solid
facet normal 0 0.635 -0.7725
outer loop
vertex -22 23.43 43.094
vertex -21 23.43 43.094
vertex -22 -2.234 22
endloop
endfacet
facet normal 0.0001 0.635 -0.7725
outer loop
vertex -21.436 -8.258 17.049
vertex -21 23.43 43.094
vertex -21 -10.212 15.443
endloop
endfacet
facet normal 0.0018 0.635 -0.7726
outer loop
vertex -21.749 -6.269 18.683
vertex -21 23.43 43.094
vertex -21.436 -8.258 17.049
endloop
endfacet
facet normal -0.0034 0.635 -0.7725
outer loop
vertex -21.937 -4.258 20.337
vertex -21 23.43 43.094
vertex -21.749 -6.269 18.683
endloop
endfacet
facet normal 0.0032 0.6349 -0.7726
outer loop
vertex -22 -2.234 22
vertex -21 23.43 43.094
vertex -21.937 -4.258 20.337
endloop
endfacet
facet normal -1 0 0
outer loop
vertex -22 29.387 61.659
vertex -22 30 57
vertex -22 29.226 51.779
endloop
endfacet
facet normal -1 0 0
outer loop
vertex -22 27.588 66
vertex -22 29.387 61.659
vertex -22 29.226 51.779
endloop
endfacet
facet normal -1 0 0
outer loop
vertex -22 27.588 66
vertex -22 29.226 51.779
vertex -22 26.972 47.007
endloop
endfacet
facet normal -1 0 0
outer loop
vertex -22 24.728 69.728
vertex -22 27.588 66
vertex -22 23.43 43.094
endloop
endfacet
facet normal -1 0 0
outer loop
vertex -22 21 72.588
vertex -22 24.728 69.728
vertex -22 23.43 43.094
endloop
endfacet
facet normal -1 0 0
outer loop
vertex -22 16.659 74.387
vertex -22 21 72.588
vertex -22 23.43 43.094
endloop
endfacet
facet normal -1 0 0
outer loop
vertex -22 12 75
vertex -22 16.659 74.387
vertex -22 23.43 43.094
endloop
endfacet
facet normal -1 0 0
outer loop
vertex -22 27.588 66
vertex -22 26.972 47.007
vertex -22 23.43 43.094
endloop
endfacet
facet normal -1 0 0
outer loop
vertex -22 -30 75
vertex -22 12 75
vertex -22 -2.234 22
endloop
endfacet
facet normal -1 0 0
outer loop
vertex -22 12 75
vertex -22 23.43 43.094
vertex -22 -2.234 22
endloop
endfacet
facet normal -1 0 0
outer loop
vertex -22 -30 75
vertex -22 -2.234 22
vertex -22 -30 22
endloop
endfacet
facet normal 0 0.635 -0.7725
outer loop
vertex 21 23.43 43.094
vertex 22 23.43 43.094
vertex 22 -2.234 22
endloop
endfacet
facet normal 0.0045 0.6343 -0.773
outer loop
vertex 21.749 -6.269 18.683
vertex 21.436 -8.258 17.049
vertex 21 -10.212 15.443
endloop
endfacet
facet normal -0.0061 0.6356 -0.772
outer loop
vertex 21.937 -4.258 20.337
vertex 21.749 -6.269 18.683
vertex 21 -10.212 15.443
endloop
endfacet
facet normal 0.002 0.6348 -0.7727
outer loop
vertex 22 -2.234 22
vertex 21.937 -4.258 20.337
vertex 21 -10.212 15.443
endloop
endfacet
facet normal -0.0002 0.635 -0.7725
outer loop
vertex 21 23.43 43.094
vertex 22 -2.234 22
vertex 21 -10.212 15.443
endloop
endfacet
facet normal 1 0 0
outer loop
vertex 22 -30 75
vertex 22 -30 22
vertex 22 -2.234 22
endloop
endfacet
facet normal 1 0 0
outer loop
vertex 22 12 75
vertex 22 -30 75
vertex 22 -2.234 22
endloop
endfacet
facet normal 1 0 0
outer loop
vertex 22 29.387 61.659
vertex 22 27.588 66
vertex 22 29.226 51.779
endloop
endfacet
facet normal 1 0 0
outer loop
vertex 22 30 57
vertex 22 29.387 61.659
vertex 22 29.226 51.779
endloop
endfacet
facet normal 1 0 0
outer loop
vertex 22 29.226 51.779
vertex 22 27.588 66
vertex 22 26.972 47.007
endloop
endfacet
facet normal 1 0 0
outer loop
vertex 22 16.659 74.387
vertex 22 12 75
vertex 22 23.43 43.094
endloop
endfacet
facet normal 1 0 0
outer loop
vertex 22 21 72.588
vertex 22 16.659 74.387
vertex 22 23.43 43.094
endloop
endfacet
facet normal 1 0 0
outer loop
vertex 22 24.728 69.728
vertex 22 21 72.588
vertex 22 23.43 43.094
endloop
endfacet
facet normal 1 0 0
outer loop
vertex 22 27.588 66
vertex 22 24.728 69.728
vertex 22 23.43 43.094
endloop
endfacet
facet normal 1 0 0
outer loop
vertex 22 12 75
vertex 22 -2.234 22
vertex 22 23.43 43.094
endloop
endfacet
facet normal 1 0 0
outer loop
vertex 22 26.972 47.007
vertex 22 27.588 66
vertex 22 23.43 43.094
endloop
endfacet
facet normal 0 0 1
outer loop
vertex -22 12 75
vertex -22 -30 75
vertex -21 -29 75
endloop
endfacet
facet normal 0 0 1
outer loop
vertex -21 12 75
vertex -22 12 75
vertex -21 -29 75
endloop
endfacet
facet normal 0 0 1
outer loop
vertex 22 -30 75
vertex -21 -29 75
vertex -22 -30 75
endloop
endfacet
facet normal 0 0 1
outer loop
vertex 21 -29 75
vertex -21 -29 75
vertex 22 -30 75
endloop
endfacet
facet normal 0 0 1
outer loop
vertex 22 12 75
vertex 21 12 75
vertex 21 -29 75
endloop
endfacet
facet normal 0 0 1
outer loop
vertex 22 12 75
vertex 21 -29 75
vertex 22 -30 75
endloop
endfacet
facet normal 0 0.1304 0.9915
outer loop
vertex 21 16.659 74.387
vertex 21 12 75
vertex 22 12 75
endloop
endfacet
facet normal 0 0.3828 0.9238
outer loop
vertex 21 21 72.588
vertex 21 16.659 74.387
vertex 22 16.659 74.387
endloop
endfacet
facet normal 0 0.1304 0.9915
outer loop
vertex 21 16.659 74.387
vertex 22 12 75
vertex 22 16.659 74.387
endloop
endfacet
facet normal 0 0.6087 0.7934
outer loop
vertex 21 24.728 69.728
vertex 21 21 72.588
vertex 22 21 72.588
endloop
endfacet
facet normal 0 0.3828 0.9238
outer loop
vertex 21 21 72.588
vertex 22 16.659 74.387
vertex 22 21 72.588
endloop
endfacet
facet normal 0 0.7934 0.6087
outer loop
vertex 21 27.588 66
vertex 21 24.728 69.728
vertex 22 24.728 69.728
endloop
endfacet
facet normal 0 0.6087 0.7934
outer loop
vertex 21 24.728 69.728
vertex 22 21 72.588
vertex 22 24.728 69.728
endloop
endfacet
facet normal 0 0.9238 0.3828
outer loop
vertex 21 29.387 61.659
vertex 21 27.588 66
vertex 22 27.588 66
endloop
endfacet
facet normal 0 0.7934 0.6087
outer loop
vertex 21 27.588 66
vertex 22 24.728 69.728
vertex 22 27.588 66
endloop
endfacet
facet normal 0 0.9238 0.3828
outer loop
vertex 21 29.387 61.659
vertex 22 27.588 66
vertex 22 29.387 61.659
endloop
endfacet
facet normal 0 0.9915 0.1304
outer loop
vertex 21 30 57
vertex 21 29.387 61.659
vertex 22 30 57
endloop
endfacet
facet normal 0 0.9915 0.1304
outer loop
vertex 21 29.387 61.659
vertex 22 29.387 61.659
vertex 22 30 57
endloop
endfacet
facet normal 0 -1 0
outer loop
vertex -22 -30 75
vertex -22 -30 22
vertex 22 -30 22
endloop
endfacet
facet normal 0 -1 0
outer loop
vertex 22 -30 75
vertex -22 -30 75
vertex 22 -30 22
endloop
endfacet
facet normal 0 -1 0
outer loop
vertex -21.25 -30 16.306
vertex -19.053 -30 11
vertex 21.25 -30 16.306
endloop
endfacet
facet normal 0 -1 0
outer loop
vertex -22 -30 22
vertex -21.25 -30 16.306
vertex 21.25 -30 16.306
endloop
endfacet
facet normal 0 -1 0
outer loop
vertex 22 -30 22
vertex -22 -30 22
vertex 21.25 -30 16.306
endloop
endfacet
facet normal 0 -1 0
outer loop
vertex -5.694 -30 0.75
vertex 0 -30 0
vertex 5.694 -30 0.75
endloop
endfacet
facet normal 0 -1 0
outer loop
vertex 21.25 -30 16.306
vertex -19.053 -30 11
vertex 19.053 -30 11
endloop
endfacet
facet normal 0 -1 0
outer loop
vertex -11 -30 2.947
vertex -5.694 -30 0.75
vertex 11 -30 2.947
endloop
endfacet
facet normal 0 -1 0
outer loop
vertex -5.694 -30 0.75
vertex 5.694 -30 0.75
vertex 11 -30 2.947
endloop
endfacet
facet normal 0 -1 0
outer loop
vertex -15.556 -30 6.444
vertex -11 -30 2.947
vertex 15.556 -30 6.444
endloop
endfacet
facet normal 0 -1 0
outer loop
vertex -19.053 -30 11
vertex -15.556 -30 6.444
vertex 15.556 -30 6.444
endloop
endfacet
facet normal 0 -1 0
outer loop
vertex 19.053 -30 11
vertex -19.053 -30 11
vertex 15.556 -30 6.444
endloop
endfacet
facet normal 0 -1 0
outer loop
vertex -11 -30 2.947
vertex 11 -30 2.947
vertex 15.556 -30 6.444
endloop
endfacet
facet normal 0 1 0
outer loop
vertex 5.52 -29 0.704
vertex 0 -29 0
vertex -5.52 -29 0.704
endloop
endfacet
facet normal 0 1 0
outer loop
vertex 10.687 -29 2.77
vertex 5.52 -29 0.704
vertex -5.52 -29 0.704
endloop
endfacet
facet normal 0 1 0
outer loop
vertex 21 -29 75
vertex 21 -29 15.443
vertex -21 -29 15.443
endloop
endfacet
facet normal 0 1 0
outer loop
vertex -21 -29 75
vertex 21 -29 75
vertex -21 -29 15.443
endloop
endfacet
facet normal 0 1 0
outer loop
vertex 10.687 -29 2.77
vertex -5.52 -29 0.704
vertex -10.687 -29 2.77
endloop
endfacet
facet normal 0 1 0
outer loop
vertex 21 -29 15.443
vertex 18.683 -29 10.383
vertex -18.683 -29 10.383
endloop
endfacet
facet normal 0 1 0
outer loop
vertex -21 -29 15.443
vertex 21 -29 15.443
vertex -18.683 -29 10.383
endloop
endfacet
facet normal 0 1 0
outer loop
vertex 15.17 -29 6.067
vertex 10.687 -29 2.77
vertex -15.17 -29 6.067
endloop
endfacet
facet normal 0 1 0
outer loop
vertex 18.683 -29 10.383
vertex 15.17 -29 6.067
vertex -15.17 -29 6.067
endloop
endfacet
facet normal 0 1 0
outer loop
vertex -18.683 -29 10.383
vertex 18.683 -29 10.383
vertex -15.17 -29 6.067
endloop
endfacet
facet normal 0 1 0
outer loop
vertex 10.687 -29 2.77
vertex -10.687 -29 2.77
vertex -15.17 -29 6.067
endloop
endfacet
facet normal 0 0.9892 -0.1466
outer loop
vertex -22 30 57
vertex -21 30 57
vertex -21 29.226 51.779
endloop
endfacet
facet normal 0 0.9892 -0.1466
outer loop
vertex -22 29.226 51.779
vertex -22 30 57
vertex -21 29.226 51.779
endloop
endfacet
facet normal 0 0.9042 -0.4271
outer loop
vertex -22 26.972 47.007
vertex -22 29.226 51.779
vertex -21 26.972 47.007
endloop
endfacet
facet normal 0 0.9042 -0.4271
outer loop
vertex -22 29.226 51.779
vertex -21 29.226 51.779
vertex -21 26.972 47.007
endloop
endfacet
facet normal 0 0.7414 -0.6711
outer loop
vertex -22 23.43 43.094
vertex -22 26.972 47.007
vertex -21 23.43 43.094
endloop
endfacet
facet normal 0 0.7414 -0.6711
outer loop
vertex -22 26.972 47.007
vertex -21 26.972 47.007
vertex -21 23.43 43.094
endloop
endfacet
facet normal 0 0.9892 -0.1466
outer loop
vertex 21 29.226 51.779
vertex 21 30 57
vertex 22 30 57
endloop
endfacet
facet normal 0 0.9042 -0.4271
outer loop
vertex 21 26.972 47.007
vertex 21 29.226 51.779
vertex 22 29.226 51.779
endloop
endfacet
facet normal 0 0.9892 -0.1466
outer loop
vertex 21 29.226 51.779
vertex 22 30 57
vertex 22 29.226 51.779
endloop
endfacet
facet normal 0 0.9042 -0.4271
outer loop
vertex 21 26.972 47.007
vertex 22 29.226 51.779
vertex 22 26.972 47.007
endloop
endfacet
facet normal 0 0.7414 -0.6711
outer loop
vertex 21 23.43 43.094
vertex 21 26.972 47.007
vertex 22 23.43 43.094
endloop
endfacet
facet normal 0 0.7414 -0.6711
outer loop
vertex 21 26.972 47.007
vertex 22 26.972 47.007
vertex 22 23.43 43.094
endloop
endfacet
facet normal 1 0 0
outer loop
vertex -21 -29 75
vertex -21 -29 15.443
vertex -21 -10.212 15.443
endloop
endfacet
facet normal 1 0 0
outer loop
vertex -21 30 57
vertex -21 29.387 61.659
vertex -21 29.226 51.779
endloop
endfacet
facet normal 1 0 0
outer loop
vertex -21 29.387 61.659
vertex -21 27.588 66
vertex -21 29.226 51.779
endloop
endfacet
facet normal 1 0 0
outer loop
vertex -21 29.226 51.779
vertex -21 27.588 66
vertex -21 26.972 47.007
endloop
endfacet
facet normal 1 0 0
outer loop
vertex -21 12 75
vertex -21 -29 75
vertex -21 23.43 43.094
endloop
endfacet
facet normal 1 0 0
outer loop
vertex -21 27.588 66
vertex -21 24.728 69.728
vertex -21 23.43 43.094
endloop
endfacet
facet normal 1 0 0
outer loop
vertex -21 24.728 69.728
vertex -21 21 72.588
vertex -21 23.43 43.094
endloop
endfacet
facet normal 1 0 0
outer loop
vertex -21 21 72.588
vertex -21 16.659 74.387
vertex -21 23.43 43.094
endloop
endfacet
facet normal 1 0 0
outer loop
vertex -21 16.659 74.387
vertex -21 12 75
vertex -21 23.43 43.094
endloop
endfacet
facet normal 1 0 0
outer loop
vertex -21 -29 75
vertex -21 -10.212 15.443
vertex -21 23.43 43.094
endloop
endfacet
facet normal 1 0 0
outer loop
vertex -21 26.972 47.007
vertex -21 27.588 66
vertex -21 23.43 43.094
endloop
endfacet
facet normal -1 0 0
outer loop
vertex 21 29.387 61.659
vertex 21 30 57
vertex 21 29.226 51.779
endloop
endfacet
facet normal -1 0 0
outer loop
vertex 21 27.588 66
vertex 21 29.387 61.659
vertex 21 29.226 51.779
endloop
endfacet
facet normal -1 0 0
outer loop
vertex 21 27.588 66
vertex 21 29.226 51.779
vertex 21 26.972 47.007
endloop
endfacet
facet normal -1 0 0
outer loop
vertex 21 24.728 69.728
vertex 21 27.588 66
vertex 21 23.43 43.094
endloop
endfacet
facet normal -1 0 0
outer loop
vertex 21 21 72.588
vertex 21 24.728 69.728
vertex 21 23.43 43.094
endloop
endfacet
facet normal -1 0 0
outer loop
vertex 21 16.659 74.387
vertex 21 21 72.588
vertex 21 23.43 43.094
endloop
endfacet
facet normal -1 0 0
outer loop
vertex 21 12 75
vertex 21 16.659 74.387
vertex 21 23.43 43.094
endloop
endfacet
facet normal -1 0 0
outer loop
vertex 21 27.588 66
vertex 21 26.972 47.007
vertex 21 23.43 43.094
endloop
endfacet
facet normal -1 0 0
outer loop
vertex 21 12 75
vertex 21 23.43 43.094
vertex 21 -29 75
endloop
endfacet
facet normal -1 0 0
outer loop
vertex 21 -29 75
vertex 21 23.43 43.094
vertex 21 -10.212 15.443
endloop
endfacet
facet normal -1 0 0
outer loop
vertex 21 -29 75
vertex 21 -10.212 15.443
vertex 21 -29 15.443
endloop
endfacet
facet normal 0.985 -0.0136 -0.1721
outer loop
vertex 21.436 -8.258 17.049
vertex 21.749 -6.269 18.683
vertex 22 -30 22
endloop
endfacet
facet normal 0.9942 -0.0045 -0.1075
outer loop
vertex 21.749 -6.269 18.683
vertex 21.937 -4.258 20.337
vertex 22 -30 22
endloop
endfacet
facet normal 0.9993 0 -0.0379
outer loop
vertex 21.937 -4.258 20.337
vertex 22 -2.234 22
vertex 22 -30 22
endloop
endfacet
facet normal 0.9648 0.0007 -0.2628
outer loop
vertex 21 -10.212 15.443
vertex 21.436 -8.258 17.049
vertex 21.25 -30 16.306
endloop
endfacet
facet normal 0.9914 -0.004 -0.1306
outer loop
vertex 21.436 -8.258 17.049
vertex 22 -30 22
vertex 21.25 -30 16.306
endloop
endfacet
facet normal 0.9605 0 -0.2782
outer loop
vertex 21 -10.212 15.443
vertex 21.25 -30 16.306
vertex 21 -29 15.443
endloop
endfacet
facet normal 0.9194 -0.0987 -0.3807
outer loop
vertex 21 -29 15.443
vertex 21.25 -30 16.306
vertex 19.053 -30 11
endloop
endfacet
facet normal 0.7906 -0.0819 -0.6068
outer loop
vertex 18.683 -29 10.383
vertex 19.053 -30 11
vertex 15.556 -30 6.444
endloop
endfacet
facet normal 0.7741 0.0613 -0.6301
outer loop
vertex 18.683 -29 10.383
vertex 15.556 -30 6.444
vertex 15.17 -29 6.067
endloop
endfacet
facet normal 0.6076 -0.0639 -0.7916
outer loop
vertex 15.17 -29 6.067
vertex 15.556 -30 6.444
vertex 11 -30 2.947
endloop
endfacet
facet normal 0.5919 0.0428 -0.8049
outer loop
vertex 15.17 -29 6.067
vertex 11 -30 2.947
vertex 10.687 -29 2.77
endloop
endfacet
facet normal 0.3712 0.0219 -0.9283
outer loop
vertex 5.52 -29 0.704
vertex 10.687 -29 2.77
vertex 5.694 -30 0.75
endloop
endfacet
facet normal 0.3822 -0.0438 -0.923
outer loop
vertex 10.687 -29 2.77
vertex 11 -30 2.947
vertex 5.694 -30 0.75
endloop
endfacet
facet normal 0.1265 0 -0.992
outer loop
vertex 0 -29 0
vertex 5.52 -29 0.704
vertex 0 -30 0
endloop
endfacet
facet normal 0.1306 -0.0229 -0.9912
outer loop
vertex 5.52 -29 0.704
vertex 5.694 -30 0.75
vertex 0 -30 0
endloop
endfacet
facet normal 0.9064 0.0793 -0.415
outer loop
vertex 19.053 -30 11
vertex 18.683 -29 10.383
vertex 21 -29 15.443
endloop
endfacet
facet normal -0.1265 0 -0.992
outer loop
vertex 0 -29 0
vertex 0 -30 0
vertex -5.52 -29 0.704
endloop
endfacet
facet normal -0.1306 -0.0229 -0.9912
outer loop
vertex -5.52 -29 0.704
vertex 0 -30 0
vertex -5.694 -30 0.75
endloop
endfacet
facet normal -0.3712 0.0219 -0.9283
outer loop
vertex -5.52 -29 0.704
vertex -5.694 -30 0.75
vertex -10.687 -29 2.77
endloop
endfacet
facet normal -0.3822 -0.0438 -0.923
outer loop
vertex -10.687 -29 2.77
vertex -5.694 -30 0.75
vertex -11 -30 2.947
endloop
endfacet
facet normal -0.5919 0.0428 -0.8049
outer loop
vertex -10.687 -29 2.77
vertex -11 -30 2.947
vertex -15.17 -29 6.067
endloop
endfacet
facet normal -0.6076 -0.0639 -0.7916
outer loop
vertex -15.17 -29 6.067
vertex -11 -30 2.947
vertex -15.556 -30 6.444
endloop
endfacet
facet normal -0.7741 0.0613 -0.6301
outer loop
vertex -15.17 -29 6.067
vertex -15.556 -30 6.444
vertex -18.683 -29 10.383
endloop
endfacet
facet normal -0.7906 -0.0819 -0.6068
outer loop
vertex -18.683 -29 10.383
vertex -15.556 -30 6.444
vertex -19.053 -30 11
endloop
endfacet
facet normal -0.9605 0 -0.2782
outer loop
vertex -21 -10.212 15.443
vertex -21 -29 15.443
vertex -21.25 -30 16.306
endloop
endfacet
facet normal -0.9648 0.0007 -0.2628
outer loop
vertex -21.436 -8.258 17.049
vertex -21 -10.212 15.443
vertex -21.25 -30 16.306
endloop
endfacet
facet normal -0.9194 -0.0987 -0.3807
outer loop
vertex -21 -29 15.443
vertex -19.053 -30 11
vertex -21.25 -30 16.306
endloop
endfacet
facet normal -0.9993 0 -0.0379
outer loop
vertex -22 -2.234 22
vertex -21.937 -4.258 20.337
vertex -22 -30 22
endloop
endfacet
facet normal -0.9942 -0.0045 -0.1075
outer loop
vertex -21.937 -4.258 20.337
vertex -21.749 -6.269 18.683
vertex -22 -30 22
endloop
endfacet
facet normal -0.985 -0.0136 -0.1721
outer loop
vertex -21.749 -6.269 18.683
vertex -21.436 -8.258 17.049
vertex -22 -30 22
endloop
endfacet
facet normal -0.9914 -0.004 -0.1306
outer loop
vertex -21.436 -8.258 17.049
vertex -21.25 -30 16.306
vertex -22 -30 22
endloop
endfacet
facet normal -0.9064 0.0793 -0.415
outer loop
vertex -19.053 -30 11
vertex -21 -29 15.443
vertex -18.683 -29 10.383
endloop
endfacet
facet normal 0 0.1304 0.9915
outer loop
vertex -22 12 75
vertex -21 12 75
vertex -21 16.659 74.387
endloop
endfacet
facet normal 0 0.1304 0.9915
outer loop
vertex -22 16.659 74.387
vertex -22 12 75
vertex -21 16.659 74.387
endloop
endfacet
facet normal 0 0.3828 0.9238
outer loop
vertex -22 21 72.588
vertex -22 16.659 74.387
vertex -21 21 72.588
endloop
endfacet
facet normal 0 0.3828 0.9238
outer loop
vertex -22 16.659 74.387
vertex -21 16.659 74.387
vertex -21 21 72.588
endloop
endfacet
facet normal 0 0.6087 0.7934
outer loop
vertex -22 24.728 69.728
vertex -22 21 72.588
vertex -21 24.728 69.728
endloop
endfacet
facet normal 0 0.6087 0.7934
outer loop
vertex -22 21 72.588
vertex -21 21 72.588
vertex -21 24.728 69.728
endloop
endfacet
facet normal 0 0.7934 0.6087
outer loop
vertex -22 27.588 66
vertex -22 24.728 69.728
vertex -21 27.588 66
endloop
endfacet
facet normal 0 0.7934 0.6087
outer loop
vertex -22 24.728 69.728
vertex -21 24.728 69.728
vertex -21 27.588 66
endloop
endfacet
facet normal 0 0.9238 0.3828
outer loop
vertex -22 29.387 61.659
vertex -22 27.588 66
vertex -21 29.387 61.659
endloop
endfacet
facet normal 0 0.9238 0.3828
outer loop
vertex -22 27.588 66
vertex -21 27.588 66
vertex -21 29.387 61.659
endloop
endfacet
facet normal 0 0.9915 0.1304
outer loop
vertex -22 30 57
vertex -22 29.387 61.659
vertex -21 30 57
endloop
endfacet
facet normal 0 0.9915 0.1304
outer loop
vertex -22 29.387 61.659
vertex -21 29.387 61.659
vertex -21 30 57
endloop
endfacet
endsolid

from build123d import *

# Parameters (mm, degrees)
EXTRUDE_1_DEPTH     = 75
CUT_EXTRUDE_1_REACH = 93.984
CUT_EXTRUDE_2_DEPTH = 99.534258002


with BuildPart() as part:
    # 草图1 → 凸台-拉伸1 (new body)
    with BuildSketch(Plane.XY):
        Polygon((21, 30), (21, -29), (-21, -29), (-21, 30), (-22, 30), (-22, -30), (22, -30), (22, 30), align=None)
    extrude(amount=EXTRUDE_1_DEPTH)

    # 切除-拉伸1: up to this face of the body (flat: up to its plane)
    cut_extrude_1_end = Plane(part.part.faces().sort_by_distance((-22, 0, 37.5))[0])
    # 草图2 → 切除-拉伸1 (cut, up to the picked face)
    with BuildSketch(Plane(origin=(22, 0, 0), x_dir=(0, 0, -1), z_dir=(1, 0, 0)), mode=Mode.PRIVATE) as cut_extrude_1_sk1:
        with BuildLine():
            Line((-43.094477021, 23.429629507), (0, -29))
            Line((0, -29), (0, 30))
            Line((0, 30), (-57, 30))
            ThreePointArc((-57, 30), (-49.310179818, 28.274724746), (-43.094477021, 23.429629507))
        make_face()
    cut_extrude_1_tool1 = split(extrude(cut_extrude_1_sk1.sketch, amount=-CUT_EXTRUDE_1_REACH, mode=Mode.PRIVATE), bisect_by=cut_extrude_1_end, keep=Keep.BOTH, mode=Mode.PRIVATE)
    # 草图2 → 切除-拉伸1 (cut, up to the picked face)
    with BuildSketch(Plane(origin=(22, 0, 0), x_dir=(0, 0, -1), z_dir=(1, 0, 0)), mode=Mode.PRIVATE) as cut_extrude_1_sk2:
        with BuildLine():
            ThreePointArc((-75, 12), (-69.727922061, 24.727922061), (-57, 30))
            Line((-57, 30), (-75, 30))
            Line((-75, 30), (-75, 12))
        make_face()
    cut_extrude_1_tool2 = split(extrude(cut_extrude_1_sk2.sketch, amount=-CUT_EXTRUDE_1_REACH, mode=Mode.PRIVATE), bisect_by=cut_extrude_1_end, keep=Keep.BOTH, mode=Mode.PRIVATE)
    add(cut_extrude_1_tool1.solids().sort_by(Axis((22, 10.461352, 16.395563), (-1, 0, 0)))[0], mode=Mode.SUBTRACT)
    add(cut_extrude_1_tool2.solids().sort_by(Axis((22, 25.979377, 70.979377), (-1, 0, 0)))[0], mode=Mode.SUBTRACT)

    # 草图3 → 切除-拉伸2 (cut, through all)
    with BuildSketch(Plane.XZ.offset(30)):
        with BuildLine():
            ThreePointArc((22, 22), (15.556349186, 6.443650814), (0, 0))
            Line((0, 0), (22, 0))
            Line((22, 0), (22, 22))
        make_face()
        with BuildLine():
            ThreePointArc((0, 0), (-15.556349186, 6.443650814), (-22, 22))
            Line((-22, 22), (-22, 0))
            Line((-22, 0), (0, 0))
        make_face()
    extrude(amount=-CUT_EXTRUDE_2_DEPTH, mode=Mode.SUBTRACT)


solid = part.part
